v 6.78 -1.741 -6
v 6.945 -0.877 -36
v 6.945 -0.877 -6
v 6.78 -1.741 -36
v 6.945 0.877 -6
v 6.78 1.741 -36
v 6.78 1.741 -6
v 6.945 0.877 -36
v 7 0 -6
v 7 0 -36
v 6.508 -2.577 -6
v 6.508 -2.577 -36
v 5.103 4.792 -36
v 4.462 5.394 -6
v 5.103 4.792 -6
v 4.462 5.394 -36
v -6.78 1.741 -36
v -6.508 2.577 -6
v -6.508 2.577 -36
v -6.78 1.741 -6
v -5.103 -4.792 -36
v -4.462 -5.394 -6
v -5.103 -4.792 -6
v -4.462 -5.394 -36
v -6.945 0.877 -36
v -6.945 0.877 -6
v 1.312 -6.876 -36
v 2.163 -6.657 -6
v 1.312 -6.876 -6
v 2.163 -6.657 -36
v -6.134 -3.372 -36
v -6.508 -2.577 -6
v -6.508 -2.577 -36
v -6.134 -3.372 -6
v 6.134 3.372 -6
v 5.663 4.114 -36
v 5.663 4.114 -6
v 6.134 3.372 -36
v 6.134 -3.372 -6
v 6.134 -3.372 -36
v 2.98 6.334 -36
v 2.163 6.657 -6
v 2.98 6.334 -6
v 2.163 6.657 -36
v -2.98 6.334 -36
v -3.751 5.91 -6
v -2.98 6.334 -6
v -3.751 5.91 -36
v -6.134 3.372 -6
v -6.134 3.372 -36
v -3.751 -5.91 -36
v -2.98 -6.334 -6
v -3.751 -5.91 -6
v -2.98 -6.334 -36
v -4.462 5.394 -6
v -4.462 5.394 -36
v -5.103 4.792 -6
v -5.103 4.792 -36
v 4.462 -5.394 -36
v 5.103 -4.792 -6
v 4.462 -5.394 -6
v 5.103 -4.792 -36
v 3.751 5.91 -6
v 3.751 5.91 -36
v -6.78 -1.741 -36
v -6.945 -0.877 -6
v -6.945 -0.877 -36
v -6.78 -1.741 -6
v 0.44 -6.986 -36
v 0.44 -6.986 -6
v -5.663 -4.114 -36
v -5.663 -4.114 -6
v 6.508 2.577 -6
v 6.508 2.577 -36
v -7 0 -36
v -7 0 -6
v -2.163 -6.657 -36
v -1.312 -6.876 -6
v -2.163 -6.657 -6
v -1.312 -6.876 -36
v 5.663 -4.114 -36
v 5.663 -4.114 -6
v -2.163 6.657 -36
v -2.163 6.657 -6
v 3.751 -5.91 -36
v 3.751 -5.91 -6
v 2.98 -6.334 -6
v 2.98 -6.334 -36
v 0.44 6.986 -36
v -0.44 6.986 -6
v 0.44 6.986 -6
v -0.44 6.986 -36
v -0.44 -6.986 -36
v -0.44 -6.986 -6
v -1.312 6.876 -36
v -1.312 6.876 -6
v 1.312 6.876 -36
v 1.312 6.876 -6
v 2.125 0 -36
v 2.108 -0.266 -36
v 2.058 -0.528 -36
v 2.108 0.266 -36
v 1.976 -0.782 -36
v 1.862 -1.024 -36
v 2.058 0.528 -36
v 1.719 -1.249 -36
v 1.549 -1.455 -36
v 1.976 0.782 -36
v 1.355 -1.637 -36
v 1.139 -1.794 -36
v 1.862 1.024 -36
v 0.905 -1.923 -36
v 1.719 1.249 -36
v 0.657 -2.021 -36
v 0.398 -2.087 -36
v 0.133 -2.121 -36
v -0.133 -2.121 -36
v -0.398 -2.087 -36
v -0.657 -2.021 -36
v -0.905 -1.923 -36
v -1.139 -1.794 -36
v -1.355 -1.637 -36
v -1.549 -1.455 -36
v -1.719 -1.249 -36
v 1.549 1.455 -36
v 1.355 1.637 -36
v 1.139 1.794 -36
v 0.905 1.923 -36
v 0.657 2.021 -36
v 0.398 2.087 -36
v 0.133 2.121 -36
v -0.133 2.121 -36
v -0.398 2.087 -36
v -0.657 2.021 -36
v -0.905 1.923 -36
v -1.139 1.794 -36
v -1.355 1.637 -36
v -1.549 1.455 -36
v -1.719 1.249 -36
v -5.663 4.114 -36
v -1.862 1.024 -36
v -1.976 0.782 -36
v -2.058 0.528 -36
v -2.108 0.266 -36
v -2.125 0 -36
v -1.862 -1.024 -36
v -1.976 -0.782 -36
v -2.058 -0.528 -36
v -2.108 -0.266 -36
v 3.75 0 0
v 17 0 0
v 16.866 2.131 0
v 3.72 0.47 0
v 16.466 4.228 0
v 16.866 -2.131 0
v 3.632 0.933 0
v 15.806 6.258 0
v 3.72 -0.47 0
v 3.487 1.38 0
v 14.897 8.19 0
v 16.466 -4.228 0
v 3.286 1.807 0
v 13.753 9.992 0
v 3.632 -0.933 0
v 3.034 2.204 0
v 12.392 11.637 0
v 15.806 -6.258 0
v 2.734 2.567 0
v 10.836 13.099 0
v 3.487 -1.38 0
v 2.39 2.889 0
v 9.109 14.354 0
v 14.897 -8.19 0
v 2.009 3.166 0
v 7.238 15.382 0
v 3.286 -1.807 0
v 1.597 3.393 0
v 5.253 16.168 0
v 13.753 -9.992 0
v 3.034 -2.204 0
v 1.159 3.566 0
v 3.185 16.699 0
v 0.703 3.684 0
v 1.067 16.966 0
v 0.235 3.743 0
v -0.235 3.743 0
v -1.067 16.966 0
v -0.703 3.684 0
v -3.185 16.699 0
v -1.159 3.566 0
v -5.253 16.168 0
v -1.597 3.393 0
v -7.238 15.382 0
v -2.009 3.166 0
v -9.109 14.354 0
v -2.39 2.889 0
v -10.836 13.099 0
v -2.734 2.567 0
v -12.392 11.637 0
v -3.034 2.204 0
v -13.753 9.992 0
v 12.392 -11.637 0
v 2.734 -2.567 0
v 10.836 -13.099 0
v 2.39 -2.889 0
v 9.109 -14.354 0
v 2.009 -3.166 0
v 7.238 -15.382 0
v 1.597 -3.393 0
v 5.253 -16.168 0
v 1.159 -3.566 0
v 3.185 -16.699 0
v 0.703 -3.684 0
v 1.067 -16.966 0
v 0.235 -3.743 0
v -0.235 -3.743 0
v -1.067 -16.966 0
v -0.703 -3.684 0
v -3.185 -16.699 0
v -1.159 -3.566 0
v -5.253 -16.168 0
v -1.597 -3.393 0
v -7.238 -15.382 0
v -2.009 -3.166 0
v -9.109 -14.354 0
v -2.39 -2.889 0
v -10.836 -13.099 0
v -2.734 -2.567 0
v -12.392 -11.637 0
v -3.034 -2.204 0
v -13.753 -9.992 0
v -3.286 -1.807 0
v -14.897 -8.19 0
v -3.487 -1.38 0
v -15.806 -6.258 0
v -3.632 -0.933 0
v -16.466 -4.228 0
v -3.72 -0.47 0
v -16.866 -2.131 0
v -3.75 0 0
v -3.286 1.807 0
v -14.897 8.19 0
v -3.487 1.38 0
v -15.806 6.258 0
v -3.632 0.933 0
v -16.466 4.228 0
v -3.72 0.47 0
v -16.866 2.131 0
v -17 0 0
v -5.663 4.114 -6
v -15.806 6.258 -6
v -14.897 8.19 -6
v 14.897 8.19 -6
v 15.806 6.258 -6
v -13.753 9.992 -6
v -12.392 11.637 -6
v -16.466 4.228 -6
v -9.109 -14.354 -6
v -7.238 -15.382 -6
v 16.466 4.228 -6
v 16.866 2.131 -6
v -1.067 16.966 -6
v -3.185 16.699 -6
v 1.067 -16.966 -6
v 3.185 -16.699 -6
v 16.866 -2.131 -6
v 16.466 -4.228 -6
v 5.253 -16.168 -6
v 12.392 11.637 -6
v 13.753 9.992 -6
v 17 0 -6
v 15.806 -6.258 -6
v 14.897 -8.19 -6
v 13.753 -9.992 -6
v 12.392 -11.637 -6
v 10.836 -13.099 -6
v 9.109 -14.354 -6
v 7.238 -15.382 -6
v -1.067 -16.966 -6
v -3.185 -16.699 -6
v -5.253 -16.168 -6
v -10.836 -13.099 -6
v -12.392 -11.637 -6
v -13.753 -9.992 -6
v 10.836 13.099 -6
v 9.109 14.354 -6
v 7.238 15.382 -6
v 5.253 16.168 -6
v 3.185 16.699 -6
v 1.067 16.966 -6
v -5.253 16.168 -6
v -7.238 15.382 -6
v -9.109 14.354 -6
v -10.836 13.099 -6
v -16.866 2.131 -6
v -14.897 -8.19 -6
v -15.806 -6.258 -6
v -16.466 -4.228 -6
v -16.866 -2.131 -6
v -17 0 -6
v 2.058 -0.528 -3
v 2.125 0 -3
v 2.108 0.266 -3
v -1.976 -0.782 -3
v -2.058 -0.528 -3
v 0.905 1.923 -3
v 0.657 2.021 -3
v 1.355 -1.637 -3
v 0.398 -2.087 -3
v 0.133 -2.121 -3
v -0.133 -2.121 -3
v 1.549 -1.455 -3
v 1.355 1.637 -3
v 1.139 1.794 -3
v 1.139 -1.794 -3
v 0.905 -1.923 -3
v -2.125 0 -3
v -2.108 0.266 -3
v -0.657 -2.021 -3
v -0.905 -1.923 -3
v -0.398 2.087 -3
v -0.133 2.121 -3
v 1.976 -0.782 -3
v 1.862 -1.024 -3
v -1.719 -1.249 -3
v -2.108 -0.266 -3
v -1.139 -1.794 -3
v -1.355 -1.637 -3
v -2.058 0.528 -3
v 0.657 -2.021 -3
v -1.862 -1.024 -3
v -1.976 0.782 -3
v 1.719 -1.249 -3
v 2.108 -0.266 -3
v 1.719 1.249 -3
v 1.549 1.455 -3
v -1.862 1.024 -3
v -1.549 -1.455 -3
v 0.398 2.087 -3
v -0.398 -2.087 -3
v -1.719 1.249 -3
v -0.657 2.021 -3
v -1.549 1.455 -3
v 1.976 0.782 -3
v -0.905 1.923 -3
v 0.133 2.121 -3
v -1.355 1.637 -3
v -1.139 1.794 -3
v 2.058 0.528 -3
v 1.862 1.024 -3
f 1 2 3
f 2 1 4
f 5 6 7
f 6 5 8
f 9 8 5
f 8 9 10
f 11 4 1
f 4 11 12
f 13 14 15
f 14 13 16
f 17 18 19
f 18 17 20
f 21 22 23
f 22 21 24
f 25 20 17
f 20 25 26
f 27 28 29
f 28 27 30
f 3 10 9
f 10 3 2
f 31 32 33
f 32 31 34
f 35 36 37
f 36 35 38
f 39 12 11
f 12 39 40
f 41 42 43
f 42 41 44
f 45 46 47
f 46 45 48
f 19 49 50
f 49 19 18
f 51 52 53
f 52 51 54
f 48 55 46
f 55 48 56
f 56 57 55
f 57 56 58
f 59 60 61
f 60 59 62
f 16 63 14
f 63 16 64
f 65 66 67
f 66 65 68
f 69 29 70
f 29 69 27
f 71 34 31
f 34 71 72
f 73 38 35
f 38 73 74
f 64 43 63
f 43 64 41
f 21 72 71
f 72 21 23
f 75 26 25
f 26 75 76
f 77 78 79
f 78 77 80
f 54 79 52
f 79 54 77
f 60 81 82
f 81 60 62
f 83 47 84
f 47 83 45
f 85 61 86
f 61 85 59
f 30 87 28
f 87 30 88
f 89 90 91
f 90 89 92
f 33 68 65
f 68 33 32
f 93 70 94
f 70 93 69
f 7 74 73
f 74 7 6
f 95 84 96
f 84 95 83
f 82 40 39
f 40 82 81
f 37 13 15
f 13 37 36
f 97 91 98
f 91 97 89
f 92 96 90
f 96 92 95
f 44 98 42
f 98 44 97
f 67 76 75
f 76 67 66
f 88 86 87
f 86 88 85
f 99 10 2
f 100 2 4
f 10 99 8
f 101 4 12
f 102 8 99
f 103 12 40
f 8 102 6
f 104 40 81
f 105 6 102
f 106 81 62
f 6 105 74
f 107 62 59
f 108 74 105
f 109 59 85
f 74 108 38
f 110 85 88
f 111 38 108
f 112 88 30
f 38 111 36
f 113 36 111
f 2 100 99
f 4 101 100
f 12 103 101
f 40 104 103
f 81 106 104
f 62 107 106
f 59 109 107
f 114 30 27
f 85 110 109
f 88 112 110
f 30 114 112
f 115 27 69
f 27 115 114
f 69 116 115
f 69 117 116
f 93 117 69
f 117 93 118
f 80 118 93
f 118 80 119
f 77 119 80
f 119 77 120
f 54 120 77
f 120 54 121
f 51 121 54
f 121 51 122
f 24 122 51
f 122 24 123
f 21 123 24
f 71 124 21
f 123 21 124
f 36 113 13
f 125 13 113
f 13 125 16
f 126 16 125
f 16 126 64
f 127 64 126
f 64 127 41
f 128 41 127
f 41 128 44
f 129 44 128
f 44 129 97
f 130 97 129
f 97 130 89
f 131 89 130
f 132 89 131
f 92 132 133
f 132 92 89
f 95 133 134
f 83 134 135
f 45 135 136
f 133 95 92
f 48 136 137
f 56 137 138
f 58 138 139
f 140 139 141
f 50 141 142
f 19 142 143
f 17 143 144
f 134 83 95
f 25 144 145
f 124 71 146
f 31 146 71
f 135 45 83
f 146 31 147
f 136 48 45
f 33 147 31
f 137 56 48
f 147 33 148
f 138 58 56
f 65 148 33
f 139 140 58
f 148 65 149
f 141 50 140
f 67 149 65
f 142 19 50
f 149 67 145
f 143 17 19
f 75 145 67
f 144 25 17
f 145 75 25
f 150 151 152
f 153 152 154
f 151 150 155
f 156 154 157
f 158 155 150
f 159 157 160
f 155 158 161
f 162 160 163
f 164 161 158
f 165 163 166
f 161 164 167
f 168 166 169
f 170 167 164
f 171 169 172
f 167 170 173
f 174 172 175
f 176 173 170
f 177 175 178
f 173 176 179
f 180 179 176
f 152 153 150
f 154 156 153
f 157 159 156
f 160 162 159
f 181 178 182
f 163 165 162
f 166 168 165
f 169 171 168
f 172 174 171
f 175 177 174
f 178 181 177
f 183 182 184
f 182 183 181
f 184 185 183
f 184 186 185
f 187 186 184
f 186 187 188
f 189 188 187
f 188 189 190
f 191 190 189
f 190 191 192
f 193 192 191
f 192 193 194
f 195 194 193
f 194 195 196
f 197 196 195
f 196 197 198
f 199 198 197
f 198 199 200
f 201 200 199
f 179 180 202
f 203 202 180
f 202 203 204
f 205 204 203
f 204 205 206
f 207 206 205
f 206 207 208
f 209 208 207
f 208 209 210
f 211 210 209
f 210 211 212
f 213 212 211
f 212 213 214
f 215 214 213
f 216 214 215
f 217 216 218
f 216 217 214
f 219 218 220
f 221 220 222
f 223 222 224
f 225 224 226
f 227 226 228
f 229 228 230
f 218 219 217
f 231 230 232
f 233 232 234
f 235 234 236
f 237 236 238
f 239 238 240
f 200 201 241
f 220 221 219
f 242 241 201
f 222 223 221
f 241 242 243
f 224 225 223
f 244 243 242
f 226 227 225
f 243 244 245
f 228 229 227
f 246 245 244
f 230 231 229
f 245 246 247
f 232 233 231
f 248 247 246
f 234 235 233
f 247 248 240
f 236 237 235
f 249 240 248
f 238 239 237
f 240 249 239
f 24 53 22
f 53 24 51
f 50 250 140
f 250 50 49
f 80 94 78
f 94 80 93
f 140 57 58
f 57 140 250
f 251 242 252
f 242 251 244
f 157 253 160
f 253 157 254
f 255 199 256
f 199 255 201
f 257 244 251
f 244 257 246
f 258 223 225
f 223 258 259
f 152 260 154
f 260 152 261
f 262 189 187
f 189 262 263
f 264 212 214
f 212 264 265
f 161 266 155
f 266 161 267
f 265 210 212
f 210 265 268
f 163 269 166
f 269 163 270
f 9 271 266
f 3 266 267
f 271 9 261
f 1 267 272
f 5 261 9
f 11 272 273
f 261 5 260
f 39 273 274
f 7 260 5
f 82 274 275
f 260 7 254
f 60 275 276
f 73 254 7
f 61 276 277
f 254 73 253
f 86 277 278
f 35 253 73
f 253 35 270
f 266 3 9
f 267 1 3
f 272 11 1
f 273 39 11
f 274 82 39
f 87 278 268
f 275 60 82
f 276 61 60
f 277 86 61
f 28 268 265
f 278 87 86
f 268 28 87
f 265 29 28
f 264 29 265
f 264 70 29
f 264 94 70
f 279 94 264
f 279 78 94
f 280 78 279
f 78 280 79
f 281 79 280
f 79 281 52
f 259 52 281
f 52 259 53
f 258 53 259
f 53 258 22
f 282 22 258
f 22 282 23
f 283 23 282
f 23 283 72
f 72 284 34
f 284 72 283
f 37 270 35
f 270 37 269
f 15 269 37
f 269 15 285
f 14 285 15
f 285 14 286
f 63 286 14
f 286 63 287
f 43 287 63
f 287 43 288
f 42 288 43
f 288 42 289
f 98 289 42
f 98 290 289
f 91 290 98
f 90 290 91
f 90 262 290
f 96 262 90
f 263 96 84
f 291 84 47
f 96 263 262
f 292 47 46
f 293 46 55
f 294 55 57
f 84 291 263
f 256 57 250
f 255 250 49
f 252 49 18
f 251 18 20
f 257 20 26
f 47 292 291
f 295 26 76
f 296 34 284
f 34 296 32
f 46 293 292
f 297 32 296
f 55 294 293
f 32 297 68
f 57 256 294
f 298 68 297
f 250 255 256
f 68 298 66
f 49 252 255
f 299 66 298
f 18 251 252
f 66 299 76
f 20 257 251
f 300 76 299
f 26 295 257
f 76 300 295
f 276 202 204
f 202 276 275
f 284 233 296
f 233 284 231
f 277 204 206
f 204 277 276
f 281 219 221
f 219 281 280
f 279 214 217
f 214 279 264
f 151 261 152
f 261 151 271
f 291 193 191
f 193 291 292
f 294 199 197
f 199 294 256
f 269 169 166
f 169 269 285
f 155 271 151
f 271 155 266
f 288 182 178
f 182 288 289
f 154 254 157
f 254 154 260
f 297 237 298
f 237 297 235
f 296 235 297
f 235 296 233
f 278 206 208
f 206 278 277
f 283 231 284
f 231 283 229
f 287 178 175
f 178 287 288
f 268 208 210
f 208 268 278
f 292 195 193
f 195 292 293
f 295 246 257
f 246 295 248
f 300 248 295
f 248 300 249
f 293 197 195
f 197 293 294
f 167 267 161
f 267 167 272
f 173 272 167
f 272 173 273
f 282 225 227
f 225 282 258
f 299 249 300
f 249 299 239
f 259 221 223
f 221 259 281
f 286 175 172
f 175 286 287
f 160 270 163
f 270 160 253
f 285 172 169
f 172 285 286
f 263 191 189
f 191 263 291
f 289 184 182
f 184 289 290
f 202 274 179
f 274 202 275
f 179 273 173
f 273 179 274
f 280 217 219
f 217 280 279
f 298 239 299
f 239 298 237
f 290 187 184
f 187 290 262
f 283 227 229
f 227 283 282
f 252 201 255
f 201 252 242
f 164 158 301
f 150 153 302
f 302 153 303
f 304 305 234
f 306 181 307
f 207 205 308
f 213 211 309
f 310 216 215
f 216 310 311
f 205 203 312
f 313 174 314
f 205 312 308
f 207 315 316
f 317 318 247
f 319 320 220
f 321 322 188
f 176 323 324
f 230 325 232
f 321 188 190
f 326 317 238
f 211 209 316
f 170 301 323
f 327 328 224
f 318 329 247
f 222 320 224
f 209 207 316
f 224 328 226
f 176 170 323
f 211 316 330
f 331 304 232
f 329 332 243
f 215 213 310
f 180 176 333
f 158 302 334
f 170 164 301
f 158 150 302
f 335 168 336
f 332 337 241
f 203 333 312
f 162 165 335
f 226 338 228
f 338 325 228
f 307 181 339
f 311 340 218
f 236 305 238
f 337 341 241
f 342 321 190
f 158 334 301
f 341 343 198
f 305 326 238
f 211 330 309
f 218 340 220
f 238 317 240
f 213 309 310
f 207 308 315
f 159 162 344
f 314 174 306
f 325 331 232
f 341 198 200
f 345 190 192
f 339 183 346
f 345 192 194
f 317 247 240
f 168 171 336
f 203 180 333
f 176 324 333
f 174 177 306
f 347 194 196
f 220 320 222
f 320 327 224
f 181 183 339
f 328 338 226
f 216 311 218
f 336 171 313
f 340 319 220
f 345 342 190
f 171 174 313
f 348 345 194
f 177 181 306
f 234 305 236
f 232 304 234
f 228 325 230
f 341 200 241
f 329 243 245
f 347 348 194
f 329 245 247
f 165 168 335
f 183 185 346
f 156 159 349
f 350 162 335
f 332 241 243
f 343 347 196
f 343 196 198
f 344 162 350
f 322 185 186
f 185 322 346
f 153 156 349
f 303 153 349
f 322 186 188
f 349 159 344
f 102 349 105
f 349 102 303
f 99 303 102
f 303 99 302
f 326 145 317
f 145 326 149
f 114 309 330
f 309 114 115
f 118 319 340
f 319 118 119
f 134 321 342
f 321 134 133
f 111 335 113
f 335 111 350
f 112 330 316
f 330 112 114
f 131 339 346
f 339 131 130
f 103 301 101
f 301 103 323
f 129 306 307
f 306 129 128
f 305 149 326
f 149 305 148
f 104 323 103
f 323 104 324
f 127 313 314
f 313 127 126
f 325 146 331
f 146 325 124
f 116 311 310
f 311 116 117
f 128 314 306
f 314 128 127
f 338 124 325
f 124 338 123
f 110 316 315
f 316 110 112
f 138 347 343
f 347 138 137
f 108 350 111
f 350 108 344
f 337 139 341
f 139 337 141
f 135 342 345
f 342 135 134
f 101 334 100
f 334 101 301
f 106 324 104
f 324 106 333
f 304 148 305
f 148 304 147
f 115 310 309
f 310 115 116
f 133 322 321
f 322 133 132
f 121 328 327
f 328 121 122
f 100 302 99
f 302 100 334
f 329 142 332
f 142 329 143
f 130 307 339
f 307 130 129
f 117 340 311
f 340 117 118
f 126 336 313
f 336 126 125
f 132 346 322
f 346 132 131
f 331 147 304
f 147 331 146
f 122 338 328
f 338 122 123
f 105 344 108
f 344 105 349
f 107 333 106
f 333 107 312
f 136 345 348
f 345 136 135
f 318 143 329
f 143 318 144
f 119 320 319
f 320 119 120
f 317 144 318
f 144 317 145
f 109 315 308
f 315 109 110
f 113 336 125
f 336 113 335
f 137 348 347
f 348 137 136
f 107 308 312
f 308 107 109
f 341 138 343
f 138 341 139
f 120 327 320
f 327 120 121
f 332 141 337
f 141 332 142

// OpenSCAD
$fn = 50;


difference() {
	union() {
		translate(v = [0, 0, -36.0000000000]) {
			cylinder(h = 36, r = 7.0000000000);
		}
		translate(v = [0, 0, -6.0000000000]) {
			cylinder(h = 6, r = 17.0000000000);
		}
	}
	union() {
		translate(v = [0, 0, 0]) {
			rotate(a = [0, 0, 0]) {
				difference() {
					union() {
						#translate(v = [0, 0, -36.0000000000]) {
							cylinder(h = 36, r = 2.0000000000);
						}
						#translate(v = [0, 0, -3]) {
							cylinder(h = 3, r = 7.0000000000, r1 = 2.1250000000, r2 = 3.7500000000);
						}
						#translate(v = [0, 0, -36.0000000000]) {
							cylinder(h = 36, r = 2.1250000000);
						}
						#translate(v = [0, 0, -36.0000000000]) {
							cylinder(h = 36, r = 2.0000000000);
						}
					}
					union();
				}
			}
		}
	}
}
